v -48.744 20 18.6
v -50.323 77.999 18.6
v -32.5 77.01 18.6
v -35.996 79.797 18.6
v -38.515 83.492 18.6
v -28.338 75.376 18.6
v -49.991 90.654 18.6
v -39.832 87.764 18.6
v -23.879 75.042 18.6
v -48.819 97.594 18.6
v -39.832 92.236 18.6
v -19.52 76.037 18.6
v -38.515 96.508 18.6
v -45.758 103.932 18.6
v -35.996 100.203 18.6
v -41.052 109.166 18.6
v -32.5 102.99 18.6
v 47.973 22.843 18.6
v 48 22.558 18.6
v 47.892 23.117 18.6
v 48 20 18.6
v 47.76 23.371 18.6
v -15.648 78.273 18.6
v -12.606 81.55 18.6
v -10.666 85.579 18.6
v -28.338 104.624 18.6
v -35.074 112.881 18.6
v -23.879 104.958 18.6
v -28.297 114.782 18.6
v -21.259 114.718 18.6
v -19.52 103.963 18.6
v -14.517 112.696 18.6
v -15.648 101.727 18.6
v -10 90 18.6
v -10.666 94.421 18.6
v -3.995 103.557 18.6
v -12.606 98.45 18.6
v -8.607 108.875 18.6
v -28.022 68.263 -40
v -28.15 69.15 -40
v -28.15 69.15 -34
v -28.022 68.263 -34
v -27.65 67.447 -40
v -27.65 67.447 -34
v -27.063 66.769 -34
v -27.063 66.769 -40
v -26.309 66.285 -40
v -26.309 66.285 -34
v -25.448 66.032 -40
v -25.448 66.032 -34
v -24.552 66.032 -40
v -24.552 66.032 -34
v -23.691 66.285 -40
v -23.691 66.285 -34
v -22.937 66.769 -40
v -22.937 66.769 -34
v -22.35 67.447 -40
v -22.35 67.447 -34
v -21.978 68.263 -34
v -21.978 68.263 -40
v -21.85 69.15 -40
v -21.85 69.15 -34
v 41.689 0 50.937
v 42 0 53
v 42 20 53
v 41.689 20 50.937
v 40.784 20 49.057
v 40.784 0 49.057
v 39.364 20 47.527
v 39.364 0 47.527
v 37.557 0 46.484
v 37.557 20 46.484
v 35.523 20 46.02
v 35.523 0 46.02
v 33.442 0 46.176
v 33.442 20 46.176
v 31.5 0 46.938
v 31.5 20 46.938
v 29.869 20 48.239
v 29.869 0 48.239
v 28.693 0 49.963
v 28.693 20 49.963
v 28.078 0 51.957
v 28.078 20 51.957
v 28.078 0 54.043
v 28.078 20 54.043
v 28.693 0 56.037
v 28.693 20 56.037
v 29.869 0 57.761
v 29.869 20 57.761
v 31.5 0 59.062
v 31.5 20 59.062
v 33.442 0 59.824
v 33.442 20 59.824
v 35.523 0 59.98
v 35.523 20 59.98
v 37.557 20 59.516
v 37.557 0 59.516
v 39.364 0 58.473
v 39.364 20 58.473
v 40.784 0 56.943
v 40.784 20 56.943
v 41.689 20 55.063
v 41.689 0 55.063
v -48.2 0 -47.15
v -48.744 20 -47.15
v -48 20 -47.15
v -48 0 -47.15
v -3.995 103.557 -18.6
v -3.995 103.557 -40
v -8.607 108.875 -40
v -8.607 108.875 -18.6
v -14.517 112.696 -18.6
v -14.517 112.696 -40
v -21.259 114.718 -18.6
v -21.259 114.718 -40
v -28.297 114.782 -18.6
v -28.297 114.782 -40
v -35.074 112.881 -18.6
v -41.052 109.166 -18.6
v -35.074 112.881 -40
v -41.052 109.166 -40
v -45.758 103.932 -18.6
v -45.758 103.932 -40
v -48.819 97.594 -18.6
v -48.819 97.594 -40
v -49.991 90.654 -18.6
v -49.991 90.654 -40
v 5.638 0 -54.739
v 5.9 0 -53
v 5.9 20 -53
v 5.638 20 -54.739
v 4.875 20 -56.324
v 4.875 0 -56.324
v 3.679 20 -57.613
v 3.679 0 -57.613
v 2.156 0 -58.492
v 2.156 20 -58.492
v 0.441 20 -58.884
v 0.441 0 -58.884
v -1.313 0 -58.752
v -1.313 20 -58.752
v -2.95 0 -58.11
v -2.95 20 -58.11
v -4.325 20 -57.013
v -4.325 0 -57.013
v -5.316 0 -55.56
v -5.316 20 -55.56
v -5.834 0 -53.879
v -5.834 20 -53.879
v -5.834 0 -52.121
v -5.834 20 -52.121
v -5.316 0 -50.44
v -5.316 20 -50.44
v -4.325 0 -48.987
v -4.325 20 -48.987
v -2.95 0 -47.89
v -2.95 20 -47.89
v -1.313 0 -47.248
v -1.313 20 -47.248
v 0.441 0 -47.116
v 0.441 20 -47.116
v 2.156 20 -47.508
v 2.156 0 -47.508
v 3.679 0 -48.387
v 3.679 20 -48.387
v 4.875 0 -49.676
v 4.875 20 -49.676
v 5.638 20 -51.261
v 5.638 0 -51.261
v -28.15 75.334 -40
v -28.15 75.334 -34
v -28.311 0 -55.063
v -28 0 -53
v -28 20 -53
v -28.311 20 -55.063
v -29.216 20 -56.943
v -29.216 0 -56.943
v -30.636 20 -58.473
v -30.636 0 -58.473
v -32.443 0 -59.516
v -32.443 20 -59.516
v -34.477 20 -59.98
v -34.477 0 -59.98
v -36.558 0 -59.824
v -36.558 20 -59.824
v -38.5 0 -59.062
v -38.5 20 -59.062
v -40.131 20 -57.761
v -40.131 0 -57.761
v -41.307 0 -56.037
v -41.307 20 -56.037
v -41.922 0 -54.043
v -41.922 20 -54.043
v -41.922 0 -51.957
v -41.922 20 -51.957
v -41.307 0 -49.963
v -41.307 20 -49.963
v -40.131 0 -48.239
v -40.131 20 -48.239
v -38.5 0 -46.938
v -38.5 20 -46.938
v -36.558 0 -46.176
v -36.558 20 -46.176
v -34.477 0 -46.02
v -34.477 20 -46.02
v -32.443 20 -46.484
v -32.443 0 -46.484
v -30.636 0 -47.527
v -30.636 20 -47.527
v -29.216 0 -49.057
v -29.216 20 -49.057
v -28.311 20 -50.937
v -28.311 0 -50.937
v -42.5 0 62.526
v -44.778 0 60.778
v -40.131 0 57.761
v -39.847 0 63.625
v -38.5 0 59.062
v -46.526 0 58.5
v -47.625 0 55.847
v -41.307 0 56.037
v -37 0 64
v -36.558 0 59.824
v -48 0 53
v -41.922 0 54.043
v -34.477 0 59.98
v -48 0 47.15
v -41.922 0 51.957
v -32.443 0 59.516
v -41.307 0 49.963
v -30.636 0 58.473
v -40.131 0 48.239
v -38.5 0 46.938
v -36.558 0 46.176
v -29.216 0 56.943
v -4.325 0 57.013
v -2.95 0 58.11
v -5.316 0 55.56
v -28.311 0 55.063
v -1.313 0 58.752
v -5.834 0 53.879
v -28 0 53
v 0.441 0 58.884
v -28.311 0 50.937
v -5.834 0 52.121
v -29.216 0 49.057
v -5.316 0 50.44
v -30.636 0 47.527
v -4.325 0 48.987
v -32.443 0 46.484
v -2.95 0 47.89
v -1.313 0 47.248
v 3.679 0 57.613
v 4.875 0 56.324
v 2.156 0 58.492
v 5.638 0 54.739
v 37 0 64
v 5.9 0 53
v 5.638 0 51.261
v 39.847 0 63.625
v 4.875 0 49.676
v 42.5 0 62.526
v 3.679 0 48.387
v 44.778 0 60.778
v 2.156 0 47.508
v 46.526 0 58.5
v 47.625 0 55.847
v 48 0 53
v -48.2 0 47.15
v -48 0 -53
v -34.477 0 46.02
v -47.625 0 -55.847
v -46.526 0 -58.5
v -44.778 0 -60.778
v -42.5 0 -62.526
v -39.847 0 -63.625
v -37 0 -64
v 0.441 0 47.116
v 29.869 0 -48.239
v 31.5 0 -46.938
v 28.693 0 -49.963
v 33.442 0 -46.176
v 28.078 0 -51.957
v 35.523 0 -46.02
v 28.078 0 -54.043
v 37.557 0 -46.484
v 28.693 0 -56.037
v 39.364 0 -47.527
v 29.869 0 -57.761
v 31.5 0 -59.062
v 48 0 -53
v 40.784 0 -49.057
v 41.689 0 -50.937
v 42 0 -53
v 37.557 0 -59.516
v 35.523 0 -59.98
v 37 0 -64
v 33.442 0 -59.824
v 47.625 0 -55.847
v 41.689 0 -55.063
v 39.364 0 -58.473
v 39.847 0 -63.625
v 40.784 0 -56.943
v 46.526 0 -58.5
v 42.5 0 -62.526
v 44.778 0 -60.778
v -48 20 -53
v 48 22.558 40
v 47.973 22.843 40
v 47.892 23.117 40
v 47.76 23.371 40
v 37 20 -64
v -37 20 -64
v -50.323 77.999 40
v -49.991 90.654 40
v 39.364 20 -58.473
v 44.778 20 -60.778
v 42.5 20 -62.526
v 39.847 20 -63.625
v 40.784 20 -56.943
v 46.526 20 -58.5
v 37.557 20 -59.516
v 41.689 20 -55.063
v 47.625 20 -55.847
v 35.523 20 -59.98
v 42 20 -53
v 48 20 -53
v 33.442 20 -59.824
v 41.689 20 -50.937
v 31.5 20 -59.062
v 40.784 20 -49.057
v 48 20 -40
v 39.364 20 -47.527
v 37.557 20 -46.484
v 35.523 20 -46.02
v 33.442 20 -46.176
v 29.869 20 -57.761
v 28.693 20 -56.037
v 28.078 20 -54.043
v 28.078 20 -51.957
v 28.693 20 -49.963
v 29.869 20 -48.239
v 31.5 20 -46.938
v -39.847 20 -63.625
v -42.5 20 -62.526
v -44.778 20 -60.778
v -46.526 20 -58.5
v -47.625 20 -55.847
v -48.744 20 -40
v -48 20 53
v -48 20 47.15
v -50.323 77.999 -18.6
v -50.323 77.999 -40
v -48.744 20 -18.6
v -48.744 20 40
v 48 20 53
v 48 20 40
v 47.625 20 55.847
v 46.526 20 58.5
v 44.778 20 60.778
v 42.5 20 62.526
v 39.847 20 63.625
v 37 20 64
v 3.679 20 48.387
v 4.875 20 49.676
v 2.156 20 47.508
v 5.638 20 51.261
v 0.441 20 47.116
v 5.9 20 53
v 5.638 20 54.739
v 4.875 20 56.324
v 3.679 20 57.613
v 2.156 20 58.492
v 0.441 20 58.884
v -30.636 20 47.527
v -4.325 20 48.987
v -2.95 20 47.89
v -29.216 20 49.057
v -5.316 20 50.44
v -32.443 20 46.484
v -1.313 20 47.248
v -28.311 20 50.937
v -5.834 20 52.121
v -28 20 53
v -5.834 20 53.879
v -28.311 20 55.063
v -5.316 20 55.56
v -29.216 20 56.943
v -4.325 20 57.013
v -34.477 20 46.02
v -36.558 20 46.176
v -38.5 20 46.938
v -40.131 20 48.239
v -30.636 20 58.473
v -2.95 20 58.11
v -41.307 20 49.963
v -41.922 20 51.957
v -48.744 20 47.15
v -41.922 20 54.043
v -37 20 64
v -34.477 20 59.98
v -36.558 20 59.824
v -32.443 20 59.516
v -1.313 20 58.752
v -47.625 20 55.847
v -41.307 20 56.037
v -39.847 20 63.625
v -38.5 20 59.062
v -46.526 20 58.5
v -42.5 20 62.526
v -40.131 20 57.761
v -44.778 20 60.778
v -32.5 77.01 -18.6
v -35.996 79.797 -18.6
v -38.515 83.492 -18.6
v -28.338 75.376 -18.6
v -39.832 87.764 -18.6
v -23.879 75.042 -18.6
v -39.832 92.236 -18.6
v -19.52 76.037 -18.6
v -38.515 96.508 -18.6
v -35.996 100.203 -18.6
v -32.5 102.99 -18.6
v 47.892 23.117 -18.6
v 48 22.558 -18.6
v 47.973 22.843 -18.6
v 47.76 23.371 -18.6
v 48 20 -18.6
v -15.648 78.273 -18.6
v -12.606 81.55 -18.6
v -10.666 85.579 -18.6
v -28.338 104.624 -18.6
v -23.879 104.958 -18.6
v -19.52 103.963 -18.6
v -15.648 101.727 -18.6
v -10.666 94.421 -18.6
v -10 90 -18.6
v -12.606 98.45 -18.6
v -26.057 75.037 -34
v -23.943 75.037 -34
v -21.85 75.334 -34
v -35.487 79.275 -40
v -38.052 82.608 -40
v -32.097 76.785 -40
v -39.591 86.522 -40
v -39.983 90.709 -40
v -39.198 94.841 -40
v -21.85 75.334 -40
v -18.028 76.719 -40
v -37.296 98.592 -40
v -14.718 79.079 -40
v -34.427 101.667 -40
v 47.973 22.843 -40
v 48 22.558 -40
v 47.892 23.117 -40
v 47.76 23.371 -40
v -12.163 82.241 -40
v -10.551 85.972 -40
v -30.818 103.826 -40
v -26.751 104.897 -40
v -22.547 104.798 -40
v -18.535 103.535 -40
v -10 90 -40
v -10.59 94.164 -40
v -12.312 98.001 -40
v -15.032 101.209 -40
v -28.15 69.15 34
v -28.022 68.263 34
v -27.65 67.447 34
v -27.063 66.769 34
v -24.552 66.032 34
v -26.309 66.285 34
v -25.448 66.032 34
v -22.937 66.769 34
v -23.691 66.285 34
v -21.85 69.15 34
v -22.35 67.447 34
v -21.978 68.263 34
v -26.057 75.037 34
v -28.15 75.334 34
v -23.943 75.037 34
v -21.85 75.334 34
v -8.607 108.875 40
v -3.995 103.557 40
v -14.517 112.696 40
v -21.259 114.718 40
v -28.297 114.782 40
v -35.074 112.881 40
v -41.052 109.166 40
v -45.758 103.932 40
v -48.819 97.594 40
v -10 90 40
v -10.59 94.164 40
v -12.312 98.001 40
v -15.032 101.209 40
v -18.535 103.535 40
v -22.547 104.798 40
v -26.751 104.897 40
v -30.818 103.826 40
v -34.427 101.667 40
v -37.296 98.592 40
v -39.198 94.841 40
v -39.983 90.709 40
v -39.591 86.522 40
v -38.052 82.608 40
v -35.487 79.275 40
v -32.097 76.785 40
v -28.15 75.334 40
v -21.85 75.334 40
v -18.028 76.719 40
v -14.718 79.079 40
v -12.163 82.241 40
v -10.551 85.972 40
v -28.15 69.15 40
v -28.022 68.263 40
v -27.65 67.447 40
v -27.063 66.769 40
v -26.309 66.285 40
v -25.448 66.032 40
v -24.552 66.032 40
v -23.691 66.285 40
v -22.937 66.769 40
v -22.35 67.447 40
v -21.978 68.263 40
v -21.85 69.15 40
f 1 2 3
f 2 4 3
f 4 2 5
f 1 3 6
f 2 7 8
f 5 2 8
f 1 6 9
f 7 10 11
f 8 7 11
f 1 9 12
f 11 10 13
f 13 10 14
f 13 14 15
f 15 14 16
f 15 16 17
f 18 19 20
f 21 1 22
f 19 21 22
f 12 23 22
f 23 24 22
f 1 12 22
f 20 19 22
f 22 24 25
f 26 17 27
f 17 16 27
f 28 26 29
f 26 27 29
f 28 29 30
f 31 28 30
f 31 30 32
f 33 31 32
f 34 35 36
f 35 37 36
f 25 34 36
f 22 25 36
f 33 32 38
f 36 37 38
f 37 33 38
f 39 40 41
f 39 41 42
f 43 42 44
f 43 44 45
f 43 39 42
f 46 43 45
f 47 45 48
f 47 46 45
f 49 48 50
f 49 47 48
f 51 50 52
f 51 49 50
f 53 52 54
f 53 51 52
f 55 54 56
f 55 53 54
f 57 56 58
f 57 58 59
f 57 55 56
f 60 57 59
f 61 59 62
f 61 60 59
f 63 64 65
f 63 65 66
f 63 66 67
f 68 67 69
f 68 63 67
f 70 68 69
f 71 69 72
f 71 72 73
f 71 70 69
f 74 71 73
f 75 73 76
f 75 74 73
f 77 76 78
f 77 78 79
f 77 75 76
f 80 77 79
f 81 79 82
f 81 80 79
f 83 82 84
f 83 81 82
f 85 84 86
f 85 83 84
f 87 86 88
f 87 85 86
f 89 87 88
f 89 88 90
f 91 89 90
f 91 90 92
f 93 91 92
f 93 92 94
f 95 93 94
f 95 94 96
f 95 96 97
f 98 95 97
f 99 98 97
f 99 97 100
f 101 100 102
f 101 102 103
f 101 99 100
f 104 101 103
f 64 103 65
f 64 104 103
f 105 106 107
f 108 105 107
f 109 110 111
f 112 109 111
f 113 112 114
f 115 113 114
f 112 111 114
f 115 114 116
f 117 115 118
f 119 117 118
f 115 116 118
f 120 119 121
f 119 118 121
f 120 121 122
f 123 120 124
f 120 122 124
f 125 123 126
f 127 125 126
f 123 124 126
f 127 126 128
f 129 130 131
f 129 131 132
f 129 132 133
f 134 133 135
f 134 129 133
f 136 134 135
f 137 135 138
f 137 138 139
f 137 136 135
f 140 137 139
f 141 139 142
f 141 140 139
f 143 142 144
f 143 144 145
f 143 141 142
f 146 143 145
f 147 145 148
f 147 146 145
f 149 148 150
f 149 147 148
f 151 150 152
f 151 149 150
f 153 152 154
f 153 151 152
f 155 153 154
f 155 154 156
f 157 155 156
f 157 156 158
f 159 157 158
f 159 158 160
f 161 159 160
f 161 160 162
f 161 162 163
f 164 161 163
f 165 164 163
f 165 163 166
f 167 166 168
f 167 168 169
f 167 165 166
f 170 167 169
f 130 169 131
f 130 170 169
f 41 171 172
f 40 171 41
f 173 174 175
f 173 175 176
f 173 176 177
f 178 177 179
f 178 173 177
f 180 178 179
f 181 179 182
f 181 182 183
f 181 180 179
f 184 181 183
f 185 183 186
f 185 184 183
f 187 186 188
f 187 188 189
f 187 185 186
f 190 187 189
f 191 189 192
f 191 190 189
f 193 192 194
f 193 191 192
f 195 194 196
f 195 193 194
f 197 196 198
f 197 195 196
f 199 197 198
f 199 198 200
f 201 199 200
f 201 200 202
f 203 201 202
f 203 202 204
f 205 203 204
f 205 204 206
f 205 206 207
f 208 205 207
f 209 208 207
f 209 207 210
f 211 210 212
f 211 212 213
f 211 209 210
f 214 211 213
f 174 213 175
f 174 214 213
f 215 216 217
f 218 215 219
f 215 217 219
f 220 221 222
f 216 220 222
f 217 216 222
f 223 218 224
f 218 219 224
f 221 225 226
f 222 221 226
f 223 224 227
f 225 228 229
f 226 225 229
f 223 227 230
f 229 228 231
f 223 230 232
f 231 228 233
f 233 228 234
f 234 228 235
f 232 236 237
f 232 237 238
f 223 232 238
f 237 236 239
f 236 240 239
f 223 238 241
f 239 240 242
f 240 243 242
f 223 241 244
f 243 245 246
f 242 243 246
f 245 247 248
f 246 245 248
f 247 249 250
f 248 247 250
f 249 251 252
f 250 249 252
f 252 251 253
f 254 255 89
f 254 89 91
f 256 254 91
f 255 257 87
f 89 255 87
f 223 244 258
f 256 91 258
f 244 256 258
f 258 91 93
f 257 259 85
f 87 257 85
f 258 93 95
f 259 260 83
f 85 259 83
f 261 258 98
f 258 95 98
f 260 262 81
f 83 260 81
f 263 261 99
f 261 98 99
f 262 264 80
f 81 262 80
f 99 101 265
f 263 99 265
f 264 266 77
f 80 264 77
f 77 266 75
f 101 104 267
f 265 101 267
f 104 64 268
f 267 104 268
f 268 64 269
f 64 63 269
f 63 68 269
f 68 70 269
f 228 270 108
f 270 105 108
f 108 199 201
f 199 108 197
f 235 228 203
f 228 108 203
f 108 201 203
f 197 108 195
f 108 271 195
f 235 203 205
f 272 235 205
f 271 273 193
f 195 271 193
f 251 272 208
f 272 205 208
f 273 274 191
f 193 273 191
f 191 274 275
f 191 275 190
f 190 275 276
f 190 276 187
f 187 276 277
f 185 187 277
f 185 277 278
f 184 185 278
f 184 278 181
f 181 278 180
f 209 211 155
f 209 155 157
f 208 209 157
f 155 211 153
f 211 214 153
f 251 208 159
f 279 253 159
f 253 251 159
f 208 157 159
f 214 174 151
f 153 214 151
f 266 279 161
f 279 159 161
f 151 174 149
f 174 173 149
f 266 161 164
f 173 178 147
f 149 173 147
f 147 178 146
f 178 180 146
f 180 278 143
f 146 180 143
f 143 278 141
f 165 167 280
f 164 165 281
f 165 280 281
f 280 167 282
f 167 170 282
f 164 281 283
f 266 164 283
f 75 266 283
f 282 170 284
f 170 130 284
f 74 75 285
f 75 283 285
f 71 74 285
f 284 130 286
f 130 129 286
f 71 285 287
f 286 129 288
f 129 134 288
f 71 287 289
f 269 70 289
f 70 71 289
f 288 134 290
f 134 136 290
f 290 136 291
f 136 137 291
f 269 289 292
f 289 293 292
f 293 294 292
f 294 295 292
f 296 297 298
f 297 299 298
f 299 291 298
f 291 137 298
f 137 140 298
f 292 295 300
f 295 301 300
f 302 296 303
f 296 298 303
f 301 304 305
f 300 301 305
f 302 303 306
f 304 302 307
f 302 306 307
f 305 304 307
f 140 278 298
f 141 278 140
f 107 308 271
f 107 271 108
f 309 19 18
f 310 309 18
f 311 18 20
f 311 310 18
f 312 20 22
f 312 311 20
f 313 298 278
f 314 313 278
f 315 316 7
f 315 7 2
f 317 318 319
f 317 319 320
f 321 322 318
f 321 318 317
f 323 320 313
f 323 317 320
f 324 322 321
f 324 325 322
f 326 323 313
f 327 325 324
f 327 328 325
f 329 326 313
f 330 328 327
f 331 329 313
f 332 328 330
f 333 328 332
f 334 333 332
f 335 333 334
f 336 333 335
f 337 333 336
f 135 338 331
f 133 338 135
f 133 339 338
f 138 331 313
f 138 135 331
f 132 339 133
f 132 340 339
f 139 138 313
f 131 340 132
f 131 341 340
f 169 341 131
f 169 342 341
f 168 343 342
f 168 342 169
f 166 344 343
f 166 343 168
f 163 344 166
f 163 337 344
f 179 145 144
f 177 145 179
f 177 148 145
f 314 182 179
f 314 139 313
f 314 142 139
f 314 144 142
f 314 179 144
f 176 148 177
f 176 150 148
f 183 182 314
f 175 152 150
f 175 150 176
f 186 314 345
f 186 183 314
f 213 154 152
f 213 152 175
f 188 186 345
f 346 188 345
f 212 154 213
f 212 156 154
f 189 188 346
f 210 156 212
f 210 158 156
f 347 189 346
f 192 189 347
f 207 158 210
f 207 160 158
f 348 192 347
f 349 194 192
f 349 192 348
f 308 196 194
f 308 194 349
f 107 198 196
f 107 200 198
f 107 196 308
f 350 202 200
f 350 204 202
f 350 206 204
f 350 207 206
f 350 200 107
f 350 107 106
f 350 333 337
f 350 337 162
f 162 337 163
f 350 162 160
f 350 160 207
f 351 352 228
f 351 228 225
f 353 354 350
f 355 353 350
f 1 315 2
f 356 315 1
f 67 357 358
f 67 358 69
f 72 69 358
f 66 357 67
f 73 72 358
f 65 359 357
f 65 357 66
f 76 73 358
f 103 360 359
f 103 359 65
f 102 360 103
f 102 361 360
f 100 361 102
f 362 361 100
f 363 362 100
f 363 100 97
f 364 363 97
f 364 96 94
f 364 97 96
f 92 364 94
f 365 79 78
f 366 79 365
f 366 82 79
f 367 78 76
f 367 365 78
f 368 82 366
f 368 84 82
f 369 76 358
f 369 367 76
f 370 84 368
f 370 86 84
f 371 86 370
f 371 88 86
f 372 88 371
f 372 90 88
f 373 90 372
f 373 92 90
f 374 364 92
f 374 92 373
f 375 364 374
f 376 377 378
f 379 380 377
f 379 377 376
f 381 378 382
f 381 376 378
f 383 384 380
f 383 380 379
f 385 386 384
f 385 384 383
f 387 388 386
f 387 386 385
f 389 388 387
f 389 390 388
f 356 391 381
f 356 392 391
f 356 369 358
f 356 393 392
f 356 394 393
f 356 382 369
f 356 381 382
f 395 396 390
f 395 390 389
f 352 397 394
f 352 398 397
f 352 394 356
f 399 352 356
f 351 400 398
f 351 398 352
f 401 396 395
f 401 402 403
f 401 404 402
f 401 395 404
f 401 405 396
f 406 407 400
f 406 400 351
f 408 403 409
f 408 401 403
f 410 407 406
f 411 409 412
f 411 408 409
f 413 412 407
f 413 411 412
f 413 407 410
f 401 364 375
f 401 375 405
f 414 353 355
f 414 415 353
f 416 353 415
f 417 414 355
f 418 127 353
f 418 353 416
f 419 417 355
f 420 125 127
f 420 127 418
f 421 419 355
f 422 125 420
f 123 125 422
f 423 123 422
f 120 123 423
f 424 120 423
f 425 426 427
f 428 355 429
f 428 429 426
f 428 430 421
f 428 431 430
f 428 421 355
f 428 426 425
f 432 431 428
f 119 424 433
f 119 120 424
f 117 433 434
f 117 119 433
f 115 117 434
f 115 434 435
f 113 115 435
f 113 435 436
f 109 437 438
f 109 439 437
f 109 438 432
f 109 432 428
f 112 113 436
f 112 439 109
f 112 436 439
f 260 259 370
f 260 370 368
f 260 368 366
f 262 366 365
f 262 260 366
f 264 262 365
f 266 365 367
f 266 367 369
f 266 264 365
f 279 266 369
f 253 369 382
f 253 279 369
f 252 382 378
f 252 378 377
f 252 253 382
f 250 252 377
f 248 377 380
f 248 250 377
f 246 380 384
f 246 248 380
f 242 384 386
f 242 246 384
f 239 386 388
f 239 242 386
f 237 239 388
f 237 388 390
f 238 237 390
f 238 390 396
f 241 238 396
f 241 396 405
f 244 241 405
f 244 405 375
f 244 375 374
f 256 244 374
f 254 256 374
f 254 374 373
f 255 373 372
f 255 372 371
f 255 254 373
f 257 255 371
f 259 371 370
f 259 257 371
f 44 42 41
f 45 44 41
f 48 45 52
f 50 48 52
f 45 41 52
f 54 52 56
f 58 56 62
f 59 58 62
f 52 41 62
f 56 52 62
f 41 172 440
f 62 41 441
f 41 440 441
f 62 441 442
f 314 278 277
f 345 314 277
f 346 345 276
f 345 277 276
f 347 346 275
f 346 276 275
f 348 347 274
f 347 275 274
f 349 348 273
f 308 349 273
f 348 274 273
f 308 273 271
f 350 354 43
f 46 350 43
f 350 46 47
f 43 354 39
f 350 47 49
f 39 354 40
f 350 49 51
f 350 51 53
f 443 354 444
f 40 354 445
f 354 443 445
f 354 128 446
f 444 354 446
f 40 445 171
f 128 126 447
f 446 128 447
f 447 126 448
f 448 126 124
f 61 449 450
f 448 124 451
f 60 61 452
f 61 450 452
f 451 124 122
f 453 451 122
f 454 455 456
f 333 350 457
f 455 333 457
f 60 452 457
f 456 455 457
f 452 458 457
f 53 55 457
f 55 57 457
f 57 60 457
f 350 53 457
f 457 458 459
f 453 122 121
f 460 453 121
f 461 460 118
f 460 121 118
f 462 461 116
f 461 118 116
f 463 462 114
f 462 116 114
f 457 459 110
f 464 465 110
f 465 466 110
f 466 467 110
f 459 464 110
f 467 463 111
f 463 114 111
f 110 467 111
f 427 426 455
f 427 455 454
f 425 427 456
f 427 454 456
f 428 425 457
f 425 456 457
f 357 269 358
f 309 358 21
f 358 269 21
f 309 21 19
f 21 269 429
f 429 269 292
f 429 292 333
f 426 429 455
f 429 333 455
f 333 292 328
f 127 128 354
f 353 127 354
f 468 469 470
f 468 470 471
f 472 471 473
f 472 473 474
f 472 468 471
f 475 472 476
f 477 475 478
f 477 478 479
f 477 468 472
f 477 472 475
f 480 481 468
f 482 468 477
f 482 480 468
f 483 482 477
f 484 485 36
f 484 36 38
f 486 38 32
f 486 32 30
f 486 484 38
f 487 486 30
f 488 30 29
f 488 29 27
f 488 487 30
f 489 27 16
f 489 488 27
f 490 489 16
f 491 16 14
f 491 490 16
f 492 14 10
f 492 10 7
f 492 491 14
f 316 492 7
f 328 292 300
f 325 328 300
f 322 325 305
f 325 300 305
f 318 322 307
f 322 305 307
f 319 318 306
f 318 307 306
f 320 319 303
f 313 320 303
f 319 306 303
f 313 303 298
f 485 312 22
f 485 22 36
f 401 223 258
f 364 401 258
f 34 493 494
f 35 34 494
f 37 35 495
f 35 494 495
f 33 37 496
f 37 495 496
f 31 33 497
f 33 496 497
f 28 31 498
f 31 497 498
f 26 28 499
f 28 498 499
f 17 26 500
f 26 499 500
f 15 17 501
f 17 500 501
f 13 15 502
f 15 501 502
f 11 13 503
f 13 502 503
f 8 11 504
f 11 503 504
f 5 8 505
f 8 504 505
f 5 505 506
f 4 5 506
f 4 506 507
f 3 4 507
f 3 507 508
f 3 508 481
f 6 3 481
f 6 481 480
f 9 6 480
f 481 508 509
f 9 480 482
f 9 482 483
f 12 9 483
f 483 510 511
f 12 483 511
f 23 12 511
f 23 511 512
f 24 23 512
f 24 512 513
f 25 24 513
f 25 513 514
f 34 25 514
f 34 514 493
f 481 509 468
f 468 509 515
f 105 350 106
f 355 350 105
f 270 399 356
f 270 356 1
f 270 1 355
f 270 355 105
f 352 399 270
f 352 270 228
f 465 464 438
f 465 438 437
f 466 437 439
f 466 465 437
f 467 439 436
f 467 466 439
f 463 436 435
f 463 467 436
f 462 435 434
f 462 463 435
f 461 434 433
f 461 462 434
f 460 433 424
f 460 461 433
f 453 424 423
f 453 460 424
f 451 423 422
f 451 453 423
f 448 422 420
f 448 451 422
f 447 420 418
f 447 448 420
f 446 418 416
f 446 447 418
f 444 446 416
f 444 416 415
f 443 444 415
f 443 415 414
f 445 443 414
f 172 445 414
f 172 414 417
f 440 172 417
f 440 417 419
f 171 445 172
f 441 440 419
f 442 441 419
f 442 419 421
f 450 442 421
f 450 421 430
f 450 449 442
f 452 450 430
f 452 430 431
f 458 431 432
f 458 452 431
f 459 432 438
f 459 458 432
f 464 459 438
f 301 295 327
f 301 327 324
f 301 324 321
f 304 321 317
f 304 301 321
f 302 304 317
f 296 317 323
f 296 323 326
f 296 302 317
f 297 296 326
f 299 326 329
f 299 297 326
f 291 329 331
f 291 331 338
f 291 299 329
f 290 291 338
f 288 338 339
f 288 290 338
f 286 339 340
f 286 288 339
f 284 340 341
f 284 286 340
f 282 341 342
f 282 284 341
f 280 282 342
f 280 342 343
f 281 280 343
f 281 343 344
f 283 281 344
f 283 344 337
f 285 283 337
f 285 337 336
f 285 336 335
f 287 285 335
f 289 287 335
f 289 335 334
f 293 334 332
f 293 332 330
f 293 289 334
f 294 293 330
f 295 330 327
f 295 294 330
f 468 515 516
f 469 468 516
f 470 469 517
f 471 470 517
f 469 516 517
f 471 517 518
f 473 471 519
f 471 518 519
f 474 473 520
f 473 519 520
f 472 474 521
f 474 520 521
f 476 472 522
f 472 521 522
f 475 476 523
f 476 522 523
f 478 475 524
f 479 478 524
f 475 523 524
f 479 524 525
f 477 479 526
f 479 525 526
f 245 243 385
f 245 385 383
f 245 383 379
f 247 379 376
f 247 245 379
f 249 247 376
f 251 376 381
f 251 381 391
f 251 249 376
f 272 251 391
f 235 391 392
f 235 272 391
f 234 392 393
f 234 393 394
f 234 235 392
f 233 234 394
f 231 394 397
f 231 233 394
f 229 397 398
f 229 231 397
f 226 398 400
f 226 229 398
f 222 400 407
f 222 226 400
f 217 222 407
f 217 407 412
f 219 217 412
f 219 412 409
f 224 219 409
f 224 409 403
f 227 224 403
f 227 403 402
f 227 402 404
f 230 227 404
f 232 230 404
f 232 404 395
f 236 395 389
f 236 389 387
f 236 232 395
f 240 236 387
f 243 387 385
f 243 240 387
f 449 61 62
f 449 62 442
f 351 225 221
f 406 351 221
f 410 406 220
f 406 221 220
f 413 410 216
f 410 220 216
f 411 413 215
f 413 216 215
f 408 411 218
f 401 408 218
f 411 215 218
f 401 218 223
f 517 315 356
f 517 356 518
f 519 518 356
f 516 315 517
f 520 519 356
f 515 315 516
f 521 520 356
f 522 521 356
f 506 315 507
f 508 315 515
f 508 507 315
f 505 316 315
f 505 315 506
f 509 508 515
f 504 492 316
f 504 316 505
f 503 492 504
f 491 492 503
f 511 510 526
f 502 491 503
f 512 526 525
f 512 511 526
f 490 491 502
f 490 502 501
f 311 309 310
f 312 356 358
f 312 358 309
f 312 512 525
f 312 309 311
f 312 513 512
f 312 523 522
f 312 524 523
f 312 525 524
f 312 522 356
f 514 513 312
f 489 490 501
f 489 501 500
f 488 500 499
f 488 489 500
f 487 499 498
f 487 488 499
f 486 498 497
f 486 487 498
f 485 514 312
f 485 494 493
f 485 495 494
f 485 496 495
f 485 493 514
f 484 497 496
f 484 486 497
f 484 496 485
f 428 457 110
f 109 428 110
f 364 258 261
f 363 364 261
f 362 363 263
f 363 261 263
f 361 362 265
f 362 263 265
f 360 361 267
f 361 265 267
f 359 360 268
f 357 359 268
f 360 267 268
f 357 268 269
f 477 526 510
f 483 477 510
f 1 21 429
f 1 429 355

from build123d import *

# Parameters (mm, degrees)
SKETCH1_R                = 7
SKETCH1_R_2              = 5.9
BOSS_EXTRUDE1_DEPTH      = 20
BOSS_EXTRUDE2_DEPTH      = 47.15
BOSS_EXTRUDE2_DEPTH_BACK = 47.15
SKETCH3_R                = 15
BOSS_EXTRUDE3_DEPTH      = 21.4
SKETCH4_R                = 15
BOSS_EXTRUDE4_DEPTH      = 21.4
CUT_EXTRUDE1_DEPTH       = 6
CUT_EXTRUDE1_DEPTH_BACK  = 6
CUT_EXTRUDE2_DEPTH       = 6
CUT_EXTRUDE2_DEPTH_BACK  = 6


with BuildPart() as part:
    # Sketch1 → Boss-Extrude1 (new body)
    with BuildSketch(Plane(origin=(0, 0, 0), x_dir=(1, 0, 0), z_dir=(0, 1, 0))):
        with BuildLine():
            Line((-37, -64), (37, -64))
            ThreePointArc((37, -64), (44.778174593, -60.778174593), (48, -53))
            Line((48, -53), (48, 53))
            ThreePointArc((48, 53), (44.778174593, 60.778174593), (37, 64))
            Line((37, 64), (-37, 64))
            ThreePointArc((-37, 64), (-44.778174593, 60.778174593), (-48, 53))
            Line((-48, 53), (-48, -53))
            ThreePointArc((-48, -53), (-44.778174593, -60.778174593), (-37, -64))
        make_face()
        with Locations((35, 53)):
            Circle(SKETCH1_R, mode=Mode.SUBTRACT)
        with Locations((35, -53)):
            Circle(SKETCH1_R, mode=Mode.SUBTRACT)
        with Locations((0, 53)):
            Circle(SKETCH1_R_2, mode=Mode.SUBTRACT)
        with Locations((0, -53)):
            Circle(SKETCH1_R_2, mode=Mode.SUBTRACT)
        with Locations((-35, 53)):
            Circle(SKETCH1_R, mode=Mode.SUBTRACT)
        with Locations((-35, -53)):
            Circle(SKETCH1_R, mode=Mode.SUBTRACT)
    extrude(amount=BOSS_EXTRUDE1_DEPTH)

    # Sketch2 → Boss-Extrude2 (add, two sides)
    with BuildSketch(Plane.XY) as boss_extrude2_sk:
        Polygon((-48.744328002, 20), (-48.2, 0), (-43.2, 0), (-43.2, 20), align=None)
    extrude(amount=BOSS_EXTRUDE2_DEPTH)
    extrude(boss_extrude2_sk.sketch, amount=-BOSS_EXTRUDE2_DEPTH_BACK)

    # Sketch3 → Boss-Extrude3 (add)
    with BuildSketch(Plane.XY.offset(40)):
        with BuildLine():
            Line((-50.322839283, 77.998533118), (-48.2, 0))
            Line((-48.2, 0), (48, 0))
            Line((48, 0), (48, 22.55795714))
            ThreePointArc((48, 22.55795714), (47.938823082, 22.981971454), (47.760282483, 23.371399248))
            Line((47.760282483, 23.371399248), (-3.995291952, 103.55736847))
            ThreePointArc((-3.995291952, 103.55736847), (-31.752406245, 114.070833178), (-49.991433124, 90.654423708))
            Line((-49.991433124, 90.654423708), (-50.322839283, 77.998533118))
        make_face()
        with Locations((-25, 90)):
            Circle(SKETCH3_R, mode=Mode.SUBTRACT)
    extrude(amount=-BOSS_EXTRUDE3_DEPTH)

    # Sketch4 → Boss-Extrude4 (add)
    with BuildSketch(Plane.XY.offset(-40)):
        with BuildLine():
            Line((-50.322839283, 77.998533118), (-48.2, 0))
            Line((-48.2, 0), (48, 0))
            Line((48, 0), (48, 22.55795714))
            ThreePointArc((48, 22.55795714), (47.938823082, 22.981971454), (47.760282483, 23.371399248))
            Line((47.760282483, 23.371399248), (-3.995291952, 103.55736847))
            ThreePointArc((-3.995291952, 103.55736847), (-31.752406245, 114.070833178), (-49.991433124, 90.654423708))
            Line((-49.991433124, 90.654423708), (-50.322839283, 77.998533118))
        make_face()
        with Locations((-25, 90)):
            Circle(SKETCH4_R, mode=Mode.SUBTRACT)
    extrude(amount=BOSS_EXTRUDE4_DEPTH)

    # Sketch5 → Cut-Extrude1 (cut, two sides)
    with BuildSketch(Plane.XY.offset(40)) as cut_extrude1_sk:
        with BuildLine():
            Line((-21.85, 69.15), (-21.85, 90))
            Line((-21.85, 90), (-28.15, 90))
            Line((-28.15, 90), (-28.15, 69.15))
            ThreePointArc((-28.15, 69.15), (-25, 66), (-21.85, 69.15))
        make_face()
    extrude(amount=CUT_EXTRUDE1_DEPTH, mode=Mode.SUBTRACT)
    extrude(cut_extrude1_sk.sketch, amount=-CUT_EXTRUDE1_DEPTH_BACK, mode=Mode.SUBTRACT)

    # Sketch6 → Cut-Extrude2 (cut, two sides)
    with BuildSketch(Plane.XY.offset(-40)) as cut_extrude2_sk:
        with BuildLine():
            Line((-21.85, 69.15), (-21.85, 90))
            Line((-21.85, 90), (-28.15, 90))
            Line((-28.15, 90), (-28.15, 69.15))
            ThreePointArc((-28.15, 69.15), (-25, 66), (-21.85, 69.15))
        make_face()
    extrude(amount=CUT_EXTRUDE2_DEPTH, mode=Mode.SUBTRACT)
    extrude(cut_extrude2_sk.sketch, amount=-CUT_EXTRUDE2_DEPTH_BACK, mode=Mode.SUBTRACT)


solid = part.part
